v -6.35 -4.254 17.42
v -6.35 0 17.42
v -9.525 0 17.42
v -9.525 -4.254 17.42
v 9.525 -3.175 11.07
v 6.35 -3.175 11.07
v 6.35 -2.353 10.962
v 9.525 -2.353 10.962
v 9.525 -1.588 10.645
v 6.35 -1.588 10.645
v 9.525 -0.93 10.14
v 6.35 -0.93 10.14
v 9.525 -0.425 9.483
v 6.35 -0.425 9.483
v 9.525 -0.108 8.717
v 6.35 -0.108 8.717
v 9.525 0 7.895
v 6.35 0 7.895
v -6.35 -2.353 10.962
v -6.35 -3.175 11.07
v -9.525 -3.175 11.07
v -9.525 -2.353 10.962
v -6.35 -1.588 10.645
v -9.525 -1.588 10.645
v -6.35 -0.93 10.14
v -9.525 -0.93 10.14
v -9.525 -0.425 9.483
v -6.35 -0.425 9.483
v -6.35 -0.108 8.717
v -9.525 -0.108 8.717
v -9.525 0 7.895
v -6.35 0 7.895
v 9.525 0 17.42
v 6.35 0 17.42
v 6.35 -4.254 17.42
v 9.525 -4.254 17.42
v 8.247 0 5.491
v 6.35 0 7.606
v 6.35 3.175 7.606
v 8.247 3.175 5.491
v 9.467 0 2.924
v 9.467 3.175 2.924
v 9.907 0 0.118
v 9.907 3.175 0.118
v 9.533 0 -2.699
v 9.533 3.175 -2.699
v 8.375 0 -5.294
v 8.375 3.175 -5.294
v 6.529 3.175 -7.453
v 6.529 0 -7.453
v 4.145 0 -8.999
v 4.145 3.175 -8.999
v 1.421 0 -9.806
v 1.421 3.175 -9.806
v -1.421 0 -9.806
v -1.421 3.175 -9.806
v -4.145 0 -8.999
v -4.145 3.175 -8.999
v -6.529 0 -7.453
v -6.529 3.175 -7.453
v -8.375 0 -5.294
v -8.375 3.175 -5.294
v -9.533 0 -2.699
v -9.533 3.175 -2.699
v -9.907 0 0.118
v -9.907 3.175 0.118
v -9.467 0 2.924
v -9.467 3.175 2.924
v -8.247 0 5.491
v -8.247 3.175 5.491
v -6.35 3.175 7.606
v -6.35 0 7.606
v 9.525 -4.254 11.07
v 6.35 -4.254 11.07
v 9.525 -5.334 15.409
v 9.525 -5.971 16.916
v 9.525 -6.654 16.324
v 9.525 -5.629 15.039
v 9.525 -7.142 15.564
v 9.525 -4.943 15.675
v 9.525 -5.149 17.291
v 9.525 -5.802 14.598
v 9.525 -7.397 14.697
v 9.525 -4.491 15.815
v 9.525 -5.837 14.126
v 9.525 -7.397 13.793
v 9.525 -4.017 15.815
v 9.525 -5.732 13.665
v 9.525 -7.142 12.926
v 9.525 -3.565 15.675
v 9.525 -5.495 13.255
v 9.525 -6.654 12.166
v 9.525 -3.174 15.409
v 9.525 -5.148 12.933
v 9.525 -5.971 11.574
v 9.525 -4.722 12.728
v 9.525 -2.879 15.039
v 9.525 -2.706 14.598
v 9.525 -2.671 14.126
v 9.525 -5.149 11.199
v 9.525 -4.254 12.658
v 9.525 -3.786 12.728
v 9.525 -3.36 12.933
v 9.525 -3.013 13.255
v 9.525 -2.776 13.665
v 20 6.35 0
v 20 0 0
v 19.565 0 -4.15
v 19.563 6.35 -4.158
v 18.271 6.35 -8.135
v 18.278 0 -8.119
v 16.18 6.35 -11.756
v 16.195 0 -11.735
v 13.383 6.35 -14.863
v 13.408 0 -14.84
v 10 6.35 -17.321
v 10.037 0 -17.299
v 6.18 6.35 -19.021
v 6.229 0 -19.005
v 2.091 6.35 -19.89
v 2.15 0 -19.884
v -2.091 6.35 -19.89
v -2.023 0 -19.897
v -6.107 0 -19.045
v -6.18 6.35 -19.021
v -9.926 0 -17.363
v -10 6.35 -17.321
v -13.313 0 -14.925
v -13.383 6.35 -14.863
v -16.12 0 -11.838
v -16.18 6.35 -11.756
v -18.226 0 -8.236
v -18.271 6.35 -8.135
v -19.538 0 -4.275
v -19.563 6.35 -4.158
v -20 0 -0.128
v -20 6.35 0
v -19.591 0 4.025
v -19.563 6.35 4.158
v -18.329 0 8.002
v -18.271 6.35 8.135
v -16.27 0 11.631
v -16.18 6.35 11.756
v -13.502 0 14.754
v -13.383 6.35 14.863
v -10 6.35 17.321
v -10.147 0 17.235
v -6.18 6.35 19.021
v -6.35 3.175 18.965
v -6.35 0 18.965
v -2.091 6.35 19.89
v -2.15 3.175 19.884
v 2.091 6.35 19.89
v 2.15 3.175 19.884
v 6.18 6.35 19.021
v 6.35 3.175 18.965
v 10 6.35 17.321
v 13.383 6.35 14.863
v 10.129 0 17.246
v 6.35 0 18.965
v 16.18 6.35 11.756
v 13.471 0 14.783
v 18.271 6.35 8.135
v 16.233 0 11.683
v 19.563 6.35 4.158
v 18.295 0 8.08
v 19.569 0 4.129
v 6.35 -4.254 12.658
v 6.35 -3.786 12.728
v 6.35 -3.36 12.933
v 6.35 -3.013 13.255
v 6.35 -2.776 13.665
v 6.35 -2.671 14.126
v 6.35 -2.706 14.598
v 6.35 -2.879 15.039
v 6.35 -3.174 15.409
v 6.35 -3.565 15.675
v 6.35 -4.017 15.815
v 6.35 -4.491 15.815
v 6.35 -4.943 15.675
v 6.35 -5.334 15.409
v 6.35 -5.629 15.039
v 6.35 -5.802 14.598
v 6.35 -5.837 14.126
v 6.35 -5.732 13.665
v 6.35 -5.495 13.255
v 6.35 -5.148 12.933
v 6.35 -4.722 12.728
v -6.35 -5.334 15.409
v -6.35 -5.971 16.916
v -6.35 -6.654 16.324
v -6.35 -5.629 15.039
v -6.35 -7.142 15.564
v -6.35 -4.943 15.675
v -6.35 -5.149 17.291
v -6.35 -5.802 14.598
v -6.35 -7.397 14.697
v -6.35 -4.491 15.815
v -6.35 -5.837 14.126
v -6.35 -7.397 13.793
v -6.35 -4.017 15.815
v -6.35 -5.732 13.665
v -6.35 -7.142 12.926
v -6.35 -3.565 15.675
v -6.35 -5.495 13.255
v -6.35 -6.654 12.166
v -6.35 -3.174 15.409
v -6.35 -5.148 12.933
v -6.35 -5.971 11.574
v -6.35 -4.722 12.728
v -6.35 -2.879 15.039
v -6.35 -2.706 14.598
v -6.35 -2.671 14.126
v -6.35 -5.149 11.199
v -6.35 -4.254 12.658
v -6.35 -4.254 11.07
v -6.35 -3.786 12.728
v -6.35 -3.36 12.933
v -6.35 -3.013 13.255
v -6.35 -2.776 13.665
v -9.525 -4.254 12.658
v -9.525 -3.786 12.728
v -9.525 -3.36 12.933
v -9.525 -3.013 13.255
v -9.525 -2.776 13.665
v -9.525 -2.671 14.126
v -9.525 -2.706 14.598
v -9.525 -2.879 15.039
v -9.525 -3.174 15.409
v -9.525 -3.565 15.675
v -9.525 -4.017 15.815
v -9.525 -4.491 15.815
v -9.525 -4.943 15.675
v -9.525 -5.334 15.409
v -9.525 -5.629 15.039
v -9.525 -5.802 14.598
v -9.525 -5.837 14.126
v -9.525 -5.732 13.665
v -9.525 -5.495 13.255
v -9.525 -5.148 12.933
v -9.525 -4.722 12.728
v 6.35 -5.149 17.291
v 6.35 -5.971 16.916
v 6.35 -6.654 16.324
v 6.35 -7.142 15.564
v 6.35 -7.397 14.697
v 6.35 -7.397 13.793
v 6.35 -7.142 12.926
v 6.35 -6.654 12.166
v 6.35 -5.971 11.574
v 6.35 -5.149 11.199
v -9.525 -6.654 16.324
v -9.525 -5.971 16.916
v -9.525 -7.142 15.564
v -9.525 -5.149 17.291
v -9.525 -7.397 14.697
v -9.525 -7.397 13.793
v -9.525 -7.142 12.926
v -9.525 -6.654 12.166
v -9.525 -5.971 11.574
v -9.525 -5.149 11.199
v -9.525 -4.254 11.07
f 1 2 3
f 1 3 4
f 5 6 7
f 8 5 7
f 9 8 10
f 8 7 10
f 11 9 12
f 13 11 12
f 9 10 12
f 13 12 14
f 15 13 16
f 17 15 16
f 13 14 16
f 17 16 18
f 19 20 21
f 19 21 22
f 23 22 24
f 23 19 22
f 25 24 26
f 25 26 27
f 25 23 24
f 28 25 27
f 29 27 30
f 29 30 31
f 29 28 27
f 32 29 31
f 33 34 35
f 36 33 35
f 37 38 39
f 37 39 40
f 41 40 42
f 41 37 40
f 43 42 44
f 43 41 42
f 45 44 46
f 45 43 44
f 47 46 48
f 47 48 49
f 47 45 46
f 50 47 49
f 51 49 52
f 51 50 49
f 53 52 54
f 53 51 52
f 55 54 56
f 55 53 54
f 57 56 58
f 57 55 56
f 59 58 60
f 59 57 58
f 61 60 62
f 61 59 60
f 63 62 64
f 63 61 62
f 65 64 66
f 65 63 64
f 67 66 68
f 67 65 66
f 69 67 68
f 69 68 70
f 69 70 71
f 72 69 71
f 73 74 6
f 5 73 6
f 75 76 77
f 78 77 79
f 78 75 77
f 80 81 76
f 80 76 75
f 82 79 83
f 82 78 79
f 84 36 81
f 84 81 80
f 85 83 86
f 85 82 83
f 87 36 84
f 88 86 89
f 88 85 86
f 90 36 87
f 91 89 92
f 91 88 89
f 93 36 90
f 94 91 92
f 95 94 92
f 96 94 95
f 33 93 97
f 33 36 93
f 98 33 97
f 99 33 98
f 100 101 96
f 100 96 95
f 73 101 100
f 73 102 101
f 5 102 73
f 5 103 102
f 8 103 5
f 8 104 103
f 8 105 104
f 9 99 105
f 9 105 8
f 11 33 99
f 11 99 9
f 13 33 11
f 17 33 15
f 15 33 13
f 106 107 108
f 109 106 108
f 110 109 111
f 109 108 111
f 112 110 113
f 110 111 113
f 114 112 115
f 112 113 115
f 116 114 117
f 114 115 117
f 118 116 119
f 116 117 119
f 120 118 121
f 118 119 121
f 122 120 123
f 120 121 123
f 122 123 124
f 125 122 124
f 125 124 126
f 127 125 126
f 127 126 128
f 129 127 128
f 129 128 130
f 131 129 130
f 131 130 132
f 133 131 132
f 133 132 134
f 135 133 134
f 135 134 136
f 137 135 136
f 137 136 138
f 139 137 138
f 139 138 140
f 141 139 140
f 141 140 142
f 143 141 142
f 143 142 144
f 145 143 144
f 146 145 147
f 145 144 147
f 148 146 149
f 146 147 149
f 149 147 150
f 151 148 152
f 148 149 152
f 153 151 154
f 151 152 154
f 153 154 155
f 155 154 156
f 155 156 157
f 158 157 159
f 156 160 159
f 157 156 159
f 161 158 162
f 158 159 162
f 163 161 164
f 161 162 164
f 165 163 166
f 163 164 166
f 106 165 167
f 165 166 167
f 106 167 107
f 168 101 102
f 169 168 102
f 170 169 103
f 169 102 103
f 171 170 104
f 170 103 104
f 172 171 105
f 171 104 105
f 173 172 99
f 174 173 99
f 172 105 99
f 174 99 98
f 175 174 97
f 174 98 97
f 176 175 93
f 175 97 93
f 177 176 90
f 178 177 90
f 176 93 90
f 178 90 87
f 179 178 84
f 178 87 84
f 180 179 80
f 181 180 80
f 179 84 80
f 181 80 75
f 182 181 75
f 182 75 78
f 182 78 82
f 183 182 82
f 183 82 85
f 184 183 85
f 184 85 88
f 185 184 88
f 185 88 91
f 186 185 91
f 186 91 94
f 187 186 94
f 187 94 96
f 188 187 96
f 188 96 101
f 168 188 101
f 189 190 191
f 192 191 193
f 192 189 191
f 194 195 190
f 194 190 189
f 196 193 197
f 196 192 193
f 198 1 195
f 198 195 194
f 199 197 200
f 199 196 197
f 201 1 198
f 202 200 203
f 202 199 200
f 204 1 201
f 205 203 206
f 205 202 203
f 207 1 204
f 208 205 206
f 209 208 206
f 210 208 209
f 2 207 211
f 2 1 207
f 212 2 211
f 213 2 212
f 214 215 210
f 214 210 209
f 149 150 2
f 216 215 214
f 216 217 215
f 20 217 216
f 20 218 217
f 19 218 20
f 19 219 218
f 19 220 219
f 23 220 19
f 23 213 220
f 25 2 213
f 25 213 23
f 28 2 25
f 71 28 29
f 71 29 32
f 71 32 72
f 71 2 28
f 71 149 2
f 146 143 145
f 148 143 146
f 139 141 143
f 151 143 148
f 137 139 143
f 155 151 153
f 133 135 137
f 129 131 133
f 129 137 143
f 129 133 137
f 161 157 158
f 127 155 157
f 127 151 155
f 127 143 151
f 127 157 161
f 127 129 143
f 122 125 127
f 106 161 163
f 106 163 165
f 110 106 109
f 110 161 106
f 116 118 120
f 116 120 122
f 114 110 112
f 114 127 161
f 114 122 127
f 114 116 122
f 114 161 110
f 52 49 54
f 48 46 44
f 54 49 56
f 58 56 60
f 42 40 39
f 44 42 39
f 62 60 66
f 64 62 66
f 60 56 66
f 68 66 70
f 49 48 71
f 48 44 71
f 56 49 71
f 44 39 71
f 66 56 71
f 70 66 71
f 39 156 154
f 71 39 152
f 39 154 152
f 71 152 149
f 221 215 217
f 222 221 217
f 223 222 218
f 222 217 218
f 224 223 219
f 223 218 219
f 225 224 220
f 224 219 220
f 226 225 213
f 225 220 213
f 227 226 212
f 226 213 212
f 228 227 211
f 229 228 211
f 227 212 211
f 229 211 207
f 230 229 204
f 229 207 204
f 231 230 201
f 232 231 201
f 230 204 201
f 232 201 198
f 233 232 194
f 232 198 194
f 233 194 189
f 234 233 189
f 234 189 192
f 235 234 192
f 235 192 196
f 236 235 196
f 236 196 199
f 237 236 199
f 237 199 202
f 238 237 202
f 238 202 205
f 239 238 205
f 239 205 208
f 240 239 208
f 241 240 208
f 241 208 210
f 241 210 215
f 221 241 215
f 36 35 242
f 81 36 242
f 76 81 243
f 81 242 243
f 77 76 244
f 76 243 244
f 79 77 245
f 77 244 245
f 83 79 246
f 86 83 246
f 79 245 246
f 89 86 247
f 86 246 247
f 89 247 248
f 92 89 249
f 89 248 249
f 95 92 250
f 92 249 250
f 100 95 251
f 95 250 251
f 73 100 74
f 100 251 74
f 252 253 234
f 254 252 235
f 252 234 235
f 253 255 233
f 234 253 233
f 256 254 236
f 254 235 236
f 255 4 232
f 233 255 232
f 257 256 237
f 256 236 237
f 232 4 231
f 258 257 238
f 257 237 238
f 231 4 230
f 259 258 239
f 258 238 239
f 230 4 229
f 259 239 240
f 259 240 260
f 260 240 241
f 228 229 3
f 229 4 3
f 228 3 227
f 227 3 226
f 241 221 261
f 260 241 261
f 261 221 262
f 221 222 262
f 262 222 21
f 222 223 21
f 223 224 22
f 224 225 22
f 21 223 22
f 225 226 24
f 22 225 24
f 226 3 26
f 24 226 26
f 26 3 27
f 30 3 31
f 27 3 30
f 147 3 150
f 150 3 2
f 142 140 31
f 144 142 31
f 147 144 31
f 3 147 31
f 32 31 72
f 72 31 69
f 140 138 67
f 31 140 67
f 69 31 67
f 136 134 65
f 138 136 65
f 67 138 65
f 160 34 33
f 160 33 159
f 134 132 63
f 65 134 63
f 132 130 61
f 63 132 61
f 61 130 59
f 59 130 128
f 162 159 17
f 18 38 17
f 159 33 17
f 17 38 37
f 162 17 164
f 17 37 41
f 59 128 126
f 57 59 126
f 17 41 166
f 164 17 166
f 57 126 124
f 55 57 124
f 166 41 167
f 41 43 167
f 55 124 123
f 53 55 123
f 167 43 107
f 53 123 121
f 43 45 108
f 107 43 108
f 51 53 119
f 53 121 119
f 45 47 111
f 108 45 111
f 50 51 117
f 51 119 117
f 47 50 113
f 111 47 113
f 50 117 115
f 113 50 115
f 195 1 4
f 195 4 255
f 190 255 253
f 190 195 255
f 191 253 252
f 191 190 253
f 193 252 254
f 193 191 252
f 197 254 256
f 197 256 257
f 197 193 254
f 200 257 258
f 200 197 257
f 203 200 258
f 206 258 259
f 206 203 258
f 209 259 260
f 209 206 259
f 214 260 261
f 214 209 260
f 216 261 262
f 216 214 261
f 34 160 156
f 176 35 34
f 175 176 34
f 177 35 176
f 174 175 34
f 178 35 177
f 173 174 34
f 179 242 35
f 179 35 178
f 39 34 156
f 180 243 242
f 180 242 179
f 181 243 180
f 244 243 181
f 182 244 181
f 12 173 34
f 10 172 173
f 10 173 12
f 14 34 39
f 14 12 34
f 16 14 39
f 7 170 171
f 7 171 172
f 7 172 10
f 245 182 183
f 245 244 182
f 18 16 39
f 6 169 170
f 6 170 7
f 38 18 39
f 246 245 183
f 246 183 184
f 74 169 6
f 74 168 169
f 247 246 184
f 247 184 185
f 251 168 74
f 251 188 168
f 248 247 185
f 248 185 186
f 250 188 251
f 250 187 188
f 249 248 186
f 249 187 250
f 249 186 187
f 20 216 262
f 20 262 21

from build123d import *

# Parameters (mm, degrees)
SKETCH1_R           = 20.000000005
BOSS_EXTRUDE1_DEPTH = 6.35
BOSS_EXTRUDE2_DEPTH = 3.175
SKETCH3_R           = 1.5875
CUT_EXTRUDE1_DEPTH  = 30.525000005
CUT_EXTRUDE2_DEPTH  = 3.175


with BuildPart() as part:
    # Sketch1 → Boss-Extrude1 (new body)
    with BuildSketch(Plane(origin=(0, 0, 0), x_dir=(1, 0, 0), z_dir=(0, 1, 0))):
        Circle(SKETCH1_R)
    extrude(amount=BOSS_EXTRUDE1_DEPTH)

    # Sketch2 → Boss-Extrude2 (add)
    with BuildSketch(Plane(origin=(6.35, 0, 0), x_dir=(0, 0, -1), z_dir=(1, 0, 0))):
        with BuildLine():
            Line((-17.420082718, 0), (-17.420082718, -4.254))
            ThreePointArc((-17.420082718, -4.254), (-14.245082718, -7.429), (-11.070082718, -4.254))
            Line((-11.070082718, -4.254), (-11.070082718, -3.175))
            ThreePointArc((-11.070082718, -3.175), (-10.140146748, -0.92993597), (-7.895082718, 0))
            Line((-7.895082718, 0), (-5.849160659, 0))
            Line((-5.849160659, 0), (-5.849160659, 6.35))
            Line((-5.849160659, 6.35), (-11.070082718, 6.35))
            ThreePointArc((-11.070082718, 6.35), (-15.560210778, 4.490128061), (-17.420082718, 0))
        make_face()
    boss_extrude2 = extrude(amount=BOSS_EXTRUDE2_DEPTH)

    # Mirror1: Boss-Extrude2 across plane
    add(boss_extrude2.mirror(Plane(origin=(0, 0, 0), x_dir=(0, 0, 1), z_dir=(1, 0, 0))))

    # Sketch3 → Cut-Extrude1 (cut, through all)
    with BuildSketch(Plane(origin=(9.525, 0, 0), x_dir=(0, 0, -1), z_dir=(1, 0, 0))):
        with Locations((-14.245082718, -4.254)):
            Circle(SKETCH3_R)
    extrude(amount=-CUT_EXTRUDE1_DEPTH, mode=Mode.SUBTRACT)

    # Sketch5 → Cut-Extrude2 (cut)
    with BuildSketch(Plane.XZ):
        with BuildLine():
            Line((6.35, 18.965165441), (6.35, 7.605609073))
            ThreePointArc((6.35, 7.605609073), (0, -9.907965955), (-6.35, 7.605609073))
            Line((-6.35, 7.605609073), (-6.35, 18.965165441))
            ThreePointArc((-6.35, 18.965165441), (0, 20.000000005), (6.35, 18.965165441))
        make_face()
    extrude(amount=-CUT_EXTRUDE2_DEPTH, mode=Mode.SUBTRACT)


solid = part.part
